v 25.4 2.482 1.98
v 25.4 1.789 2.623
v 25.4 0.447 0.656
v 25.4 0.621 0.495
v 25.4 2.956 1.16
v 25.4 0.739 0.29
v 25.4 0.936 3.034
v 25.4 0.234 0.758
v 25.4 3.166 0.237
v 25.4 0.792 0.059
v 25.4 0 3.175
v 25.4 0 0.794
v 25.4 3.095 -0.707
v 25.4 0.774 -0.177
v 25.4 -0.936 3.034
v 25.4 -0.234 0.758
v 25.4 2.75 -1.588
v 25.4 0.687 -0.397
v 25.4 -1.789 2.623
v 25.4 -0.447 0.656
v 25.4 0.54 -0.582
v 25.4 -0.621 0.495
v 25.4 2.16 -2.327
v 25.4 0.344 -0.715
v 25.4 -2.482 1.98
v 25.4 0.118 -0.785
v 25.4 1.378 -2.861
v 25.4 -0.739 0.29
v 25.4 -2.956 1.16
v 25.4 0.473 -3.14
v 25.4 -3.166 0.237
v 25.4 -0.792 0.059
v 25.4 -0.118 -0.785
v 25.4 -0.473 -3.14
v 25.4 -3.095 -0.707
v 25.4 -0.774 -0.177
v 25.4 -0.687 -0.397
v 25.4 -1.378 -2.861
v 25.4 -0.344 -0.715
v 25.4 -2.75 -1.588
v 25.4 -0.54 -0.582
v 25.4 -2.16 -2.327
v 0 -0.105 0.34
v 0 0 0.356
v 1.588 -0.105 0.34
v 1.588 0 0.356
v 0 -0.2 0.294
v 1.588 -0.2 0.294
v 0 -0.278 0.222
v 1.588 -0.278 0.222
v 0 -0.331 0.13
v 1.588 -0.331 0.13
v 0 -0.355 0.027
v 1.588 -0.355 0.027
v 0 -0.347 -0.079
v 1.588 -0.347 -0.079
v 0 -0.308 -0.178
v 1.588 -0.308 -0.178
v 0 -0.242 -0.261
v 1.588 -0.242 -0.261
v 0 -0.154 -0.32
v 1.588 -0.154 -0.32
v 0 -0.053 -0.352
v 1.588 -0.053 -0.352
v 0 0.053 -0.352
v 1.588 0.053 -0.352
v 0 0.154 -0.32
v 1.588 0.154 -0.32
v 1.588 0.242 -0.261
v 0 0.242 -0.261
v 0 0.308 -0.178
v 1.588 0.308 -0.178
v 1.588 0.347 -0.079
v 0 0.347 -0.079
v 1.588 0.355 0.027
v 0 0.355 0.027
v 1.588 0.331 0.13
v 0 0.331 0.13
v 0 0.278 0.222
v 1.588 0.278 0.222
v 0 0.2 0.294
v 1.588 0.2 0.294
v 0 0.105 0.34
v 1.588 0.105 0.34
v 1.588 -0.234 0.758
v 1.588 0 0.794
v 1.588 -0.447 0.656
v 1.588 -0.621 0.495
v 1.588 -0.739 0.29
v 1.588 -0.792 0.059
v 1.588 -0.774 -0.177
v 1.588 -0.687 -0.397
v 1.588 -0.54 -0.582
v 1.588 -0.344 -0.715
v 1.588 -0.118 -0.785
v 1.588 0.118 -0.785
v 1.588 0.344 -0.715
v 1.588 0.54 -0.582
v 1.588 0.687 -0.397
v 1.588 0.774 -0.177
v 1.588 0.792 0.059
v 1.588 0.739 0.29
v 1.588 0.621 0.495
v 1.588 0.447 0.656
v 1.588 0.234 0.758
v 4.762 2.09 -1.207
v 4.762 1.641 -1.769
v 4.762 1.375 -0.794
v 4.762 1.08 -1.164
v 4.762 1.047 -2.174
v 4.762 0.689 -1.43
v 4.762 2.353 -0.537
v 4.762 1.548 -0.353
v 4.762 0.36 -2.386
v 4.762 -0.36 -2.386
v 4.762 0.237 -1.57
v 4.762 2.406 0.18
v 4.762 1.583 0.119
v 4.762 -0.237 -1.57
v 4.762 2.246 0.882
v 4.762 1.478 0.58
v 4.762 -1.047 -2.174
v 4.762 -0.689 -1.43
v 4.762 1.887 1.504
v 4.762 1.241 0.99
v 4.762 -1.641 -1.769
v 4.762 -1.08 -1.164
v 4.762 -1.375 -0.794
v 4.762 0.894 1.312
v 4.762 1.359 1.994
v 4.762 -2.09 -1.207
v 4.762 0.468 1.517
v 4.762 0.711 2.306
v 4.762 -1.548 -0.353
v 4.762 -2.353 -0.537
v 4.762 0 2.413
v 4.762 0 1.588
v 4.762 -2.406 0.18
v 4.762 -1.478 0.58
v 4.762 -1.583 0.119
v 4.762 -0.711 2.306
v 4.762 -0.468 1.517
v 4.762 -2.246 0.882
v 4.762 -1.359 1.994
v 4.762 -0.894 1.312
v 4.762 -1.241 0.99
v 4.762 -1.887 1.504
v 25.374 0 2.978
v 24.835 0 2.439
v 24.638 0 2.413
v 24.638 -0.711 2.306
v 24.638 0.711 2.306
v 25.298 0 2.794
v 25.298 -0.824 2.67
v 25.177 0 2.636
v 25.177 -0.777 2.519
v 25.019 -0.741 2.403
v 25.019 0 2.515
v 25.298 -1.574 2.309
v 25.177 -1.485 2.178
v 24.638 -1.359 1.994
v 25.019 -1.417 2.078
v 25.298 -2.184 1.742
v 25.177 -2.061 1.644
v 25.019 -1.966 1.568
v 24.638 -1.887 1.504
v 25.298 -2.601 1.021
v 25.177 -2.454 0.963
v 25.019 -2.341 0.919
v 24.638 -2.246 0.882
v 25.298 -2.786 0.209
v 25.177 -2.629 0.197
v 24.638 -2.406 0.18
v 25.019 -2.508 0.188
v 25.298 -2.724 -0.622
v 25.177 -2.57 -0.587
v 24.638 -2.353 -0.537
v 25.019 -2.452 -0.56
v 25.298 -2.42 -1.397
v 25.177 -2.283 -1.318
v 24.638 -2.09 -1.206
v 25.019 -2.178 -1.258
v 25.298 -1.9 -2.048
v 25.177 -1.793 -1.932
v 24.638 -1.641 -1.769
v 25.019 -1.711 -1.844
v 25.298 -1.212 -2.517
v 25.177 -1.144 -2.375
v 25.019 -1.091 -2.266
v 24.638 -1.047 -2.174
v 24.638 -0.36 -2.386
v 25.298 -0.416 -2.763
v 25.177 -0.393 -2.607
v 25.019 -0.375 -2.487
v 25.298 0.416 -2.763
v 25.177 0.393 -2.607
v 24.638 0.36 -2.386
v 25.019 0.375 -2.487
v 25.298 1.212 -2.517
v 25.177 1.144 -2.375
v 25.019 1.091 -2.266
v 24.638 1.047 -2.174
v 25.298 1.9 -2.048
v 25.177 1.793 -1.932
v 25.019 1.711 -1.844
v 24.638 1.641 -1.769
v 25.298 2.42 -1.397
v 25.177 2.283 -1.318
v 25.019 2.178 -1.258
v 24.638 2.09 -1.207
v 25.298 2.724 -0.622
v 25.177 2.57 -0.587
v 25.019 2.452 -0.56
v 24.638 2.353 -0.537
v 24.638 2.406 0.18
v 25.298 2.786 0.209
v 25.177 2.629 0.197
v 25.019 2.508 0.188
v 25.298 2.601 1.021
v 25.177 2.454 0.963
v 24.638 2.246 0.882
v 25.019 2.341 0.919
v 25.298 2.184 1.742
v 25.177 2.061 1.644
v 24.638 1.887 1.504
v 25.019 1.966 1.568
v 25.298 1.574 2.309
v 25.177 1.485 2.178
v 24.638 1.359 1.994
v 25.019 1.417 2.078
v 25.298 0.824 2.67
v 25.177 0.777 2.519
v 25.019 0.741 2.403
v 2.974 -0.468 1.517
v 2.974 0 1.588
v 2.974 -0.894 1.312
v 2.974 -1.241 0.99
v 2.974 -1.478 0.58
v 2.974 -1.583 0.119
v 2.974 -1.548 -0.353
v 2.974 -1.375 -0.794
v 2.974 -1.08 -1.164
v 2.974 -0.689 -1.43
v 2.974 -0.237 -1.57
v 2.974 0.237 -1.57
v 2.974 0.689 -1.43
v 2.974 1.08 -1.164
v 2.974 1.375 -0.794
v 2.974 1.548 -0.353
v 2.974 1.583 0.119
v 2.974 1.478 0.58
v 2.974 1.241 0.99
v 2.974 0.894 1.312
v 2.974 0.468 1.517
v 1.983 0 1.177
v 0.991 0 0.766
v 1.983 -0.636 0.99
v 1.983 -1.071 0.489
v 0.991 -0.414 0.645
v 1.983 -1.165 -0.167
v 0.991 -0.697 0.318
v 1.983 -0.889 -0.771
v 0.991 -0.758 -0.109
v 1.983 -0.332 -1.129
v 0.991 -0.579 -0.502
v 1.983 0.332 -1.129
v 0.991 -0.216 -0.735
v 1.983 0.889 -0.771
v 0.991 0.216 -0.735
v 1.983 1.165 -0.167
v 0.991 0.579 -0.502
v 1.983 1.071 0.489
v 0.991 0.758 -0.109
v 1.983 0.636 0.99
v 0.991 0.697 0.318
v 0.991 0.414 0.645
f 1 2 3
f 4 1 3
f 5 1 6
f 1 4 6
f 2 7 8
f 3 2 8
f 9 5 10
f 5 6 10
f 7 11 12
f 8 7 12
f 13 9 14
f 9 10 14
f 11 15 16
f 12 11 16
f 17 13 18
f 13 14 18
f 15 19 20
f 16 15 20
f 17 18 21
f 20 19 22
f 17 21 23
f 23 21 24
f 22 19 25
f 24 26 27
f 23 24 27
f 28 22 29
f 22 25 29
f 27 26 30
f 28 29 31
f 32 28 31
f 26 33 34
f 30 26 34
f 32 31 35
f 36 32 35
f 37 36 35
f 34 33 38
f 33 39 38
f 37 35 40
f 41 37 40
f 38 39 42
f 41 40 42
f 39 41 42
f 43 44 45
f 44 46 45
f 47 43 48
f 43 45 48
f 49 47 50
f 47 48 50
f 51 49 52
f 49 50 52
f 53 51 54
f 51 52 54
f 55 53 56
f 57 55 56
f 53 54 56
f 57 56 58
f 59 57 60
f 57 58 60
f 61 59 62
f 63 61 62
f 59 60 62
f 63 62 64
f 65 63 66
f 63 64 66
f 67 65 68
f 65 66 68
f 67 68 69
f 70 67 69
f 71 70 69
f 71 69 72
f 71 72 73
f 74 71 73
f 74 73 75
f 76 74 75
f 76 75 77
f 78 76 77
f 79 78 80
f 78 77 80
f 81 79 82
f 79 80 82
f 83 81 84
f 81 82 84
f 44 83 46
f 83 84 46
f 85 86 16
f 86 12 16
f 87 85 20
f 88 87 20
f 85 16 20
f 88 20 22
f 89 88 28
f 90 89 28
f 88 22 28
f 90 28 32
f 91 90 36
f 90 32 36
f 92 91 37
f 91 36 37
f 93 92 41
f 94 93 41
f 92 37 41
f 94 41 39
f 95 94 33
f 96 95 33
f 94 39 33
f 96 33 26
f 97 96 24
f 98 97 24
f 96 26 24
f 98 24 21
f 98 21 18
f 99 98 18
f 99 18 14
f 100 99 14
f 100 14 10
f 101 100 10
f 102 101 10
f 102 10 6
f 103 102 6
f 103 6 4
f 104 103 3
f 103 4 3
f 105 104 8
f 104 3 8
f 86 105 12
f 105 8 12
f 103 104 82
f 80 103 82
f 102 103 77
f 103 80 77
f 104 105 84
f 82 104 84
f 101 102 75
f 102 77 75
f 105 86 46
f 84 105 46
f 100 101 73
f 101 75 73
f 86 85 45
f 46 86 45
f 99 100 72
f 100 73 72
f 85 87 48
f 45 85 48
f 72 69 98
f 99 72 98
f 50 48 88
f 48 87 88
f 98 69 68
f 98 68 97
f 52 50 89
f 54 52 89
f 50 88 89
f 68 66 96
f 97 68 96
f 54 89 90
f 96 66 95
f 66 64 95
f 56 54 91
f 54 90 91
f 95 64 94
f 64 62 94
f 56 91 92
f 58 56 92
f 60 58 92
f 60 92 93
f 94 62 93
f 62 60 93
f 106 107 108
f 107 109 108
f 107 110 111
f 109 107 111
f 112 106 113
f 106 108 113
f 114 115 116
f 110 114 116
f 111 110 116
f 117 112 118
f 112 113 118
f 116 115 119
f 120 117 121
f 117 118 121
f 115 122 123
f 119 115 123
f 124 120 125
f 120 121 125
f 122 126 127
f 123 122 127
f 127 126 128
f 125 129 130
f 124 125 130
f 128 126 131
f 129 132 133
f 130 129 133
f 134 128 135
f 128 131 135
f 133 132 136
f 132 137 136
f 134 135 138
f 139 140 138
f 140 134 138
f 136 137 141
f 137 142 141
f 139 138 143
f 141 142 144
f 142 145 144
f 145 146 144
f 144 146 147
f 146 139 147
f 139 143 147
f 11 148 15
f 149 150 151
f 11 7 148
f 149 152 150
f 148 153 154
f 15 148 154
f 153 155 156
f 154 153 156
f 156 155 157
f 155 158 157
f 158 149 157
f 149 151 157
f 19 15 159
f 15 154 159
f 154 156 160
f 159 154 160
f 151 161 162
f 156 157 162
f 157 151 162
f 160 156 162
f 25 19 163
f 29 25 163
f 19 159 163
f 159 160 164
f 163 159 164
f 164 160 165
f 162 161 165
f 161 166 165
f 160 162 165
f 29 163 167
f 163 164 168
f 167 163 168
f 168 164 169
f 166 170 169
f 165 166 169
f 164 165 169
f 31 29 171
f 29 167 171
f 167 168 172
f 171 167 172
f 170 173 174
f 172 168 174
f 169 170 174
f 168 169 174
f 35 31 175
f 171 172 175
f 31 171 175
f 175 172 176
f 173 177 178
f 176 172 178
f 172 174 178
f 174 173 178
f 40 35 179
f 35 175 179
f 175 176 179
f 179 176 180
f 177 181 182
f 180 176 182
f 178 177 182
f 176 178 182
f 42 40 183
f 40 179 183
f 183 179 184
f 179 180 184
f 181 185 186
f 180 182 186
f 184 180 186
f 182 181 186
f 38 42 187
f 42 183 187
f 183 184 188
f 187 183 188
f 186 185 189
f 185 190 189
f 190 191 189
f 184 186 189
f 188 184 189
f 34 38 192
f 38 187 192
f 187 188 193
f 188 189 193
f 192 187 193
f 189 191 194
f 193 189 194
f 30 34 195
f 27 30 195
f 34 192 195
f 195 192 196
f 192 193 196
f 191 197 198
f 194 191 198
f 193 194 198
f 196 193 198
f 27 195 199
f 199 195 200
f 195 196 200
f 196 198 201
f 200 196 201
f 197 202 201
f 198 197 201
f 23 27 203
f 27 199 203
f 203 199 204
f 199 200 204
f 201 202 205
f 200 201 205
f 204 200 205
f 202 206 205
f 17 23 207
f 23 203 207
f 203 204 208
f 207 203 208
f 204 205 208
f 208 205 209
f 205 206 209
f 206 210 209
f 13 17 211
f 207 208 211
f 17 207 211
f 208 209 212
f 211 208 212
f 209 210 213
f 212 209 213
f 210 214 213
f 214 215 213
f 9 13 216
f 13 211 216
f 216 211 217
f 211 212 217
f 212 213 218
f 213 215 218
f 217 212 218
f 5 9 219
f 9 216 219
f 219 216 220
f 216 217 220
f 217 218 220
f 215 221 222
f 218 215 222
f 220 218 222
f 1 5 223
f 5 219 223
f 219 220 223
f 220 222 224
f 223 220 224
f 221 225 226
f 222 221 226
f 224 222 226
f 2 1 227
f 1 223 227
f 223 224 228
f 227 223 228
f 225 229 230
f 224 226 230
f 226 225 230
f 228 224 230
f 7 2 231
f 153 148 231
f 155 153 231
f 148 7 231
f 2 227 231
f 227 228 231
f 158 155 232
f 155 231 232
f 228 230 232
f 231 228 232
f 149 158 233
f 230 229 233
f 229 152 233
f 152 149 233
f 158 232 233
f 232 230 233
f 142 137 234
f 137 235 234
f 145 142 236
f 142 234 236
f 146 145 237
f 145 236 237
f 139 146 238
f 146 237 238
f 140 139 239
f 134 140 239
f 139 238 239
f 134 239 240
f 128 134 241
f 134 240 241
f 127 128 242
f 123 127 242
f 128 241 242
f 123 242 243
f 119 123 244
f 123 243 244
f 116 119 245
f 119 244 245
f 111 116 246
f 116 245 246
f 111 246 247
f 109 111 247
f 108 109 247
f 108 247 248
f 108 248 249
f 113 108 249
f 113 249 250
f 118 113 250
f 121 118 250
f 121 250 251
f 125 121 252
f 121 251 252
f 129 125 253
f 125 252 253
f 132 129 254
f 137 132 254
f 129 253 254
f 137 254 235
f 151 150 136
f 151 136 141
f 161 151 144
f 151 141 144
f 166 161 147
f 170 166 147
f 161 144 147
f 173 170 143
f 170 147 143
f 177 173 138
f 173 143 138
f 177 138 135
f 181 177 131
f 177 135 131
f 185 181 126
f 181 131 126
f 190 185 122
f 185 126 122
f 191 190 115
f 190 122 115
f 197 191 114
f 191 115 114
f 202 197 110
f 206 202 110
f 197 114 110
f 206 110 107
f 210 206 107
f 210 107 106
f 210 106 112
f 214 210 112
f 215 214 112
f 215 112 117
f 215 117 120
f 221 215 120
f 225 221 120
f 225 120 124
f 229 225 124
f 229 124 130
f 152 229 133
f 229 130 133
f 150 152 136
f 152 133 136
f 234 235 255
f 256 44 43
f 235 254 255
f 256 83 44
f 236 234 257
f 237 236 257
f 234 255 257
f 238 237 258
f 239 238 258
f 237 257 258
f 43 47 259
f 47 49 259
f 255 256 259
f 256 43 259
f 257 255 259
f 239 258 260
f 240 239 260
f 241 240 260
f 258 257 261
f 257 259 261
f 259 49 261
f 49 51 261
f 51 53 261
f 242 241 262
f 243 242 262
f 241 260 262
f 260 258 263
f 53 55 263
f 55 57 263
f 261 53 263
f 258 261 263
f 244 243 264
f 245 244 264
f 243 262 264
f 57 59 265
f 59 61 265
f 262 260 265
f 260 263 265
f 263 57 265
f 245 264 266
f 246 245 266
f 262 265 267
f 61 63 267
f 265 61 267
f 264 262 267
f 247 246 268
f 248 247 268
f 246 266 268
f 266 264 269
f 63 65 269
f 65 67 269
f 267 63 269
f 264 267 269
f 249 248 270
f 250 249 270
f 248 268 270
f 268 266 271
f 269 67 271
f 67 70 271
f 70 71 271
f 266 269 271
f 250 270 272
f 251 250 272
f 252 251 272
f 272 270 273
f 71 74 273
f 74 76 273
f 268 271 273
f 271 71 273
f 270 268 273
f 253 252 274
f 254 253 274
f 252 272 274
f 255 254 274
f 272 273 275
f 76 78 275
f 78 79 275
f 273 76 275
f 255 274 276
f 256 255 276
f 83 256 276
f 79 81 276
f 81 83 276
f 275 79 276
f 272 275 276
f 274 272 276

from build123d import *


with BuildPart() as part:
    # Sketch1 → Revolve1 (revolve)
    with BuildSketch(Plane.XY, mode=Mode.PRIVATE) as revolve1_sk:
        with BuildLine():
            Line((0, 0.3556), (1.5875, 0.3556))
            Line((1.5875, 0.3556), (1.5875, 0.79375))
            Line((1.5875, 0.79375), (25.4, 0.79375))
            Line((25.4, 0.79375), (25.4, 2.413))
            Line((25.4, 2.413), (25.4, 3.175))
            ThreePointArc((25.4, 3.175), (25.176815367, 2.636184633), (24.638, 2.413))
            Line((24.638, 2.413), (4.7625, 2.413))
            Line((4.7625, 2.413), (4.7625, 1.5875))
            Line((4.7625, 1.5875), (2.974069687, 1.5875))
            Line((2.974069687, 1.5875), (0, 0.3556))
        make_face()
    revolve(revolve1_sk.sketch.rotate(Axis((0, 0, 0), (1, 0, 0)), 90), axis=Axis((0, 0, 0), (1, 0, 0)))


solid = part.part
